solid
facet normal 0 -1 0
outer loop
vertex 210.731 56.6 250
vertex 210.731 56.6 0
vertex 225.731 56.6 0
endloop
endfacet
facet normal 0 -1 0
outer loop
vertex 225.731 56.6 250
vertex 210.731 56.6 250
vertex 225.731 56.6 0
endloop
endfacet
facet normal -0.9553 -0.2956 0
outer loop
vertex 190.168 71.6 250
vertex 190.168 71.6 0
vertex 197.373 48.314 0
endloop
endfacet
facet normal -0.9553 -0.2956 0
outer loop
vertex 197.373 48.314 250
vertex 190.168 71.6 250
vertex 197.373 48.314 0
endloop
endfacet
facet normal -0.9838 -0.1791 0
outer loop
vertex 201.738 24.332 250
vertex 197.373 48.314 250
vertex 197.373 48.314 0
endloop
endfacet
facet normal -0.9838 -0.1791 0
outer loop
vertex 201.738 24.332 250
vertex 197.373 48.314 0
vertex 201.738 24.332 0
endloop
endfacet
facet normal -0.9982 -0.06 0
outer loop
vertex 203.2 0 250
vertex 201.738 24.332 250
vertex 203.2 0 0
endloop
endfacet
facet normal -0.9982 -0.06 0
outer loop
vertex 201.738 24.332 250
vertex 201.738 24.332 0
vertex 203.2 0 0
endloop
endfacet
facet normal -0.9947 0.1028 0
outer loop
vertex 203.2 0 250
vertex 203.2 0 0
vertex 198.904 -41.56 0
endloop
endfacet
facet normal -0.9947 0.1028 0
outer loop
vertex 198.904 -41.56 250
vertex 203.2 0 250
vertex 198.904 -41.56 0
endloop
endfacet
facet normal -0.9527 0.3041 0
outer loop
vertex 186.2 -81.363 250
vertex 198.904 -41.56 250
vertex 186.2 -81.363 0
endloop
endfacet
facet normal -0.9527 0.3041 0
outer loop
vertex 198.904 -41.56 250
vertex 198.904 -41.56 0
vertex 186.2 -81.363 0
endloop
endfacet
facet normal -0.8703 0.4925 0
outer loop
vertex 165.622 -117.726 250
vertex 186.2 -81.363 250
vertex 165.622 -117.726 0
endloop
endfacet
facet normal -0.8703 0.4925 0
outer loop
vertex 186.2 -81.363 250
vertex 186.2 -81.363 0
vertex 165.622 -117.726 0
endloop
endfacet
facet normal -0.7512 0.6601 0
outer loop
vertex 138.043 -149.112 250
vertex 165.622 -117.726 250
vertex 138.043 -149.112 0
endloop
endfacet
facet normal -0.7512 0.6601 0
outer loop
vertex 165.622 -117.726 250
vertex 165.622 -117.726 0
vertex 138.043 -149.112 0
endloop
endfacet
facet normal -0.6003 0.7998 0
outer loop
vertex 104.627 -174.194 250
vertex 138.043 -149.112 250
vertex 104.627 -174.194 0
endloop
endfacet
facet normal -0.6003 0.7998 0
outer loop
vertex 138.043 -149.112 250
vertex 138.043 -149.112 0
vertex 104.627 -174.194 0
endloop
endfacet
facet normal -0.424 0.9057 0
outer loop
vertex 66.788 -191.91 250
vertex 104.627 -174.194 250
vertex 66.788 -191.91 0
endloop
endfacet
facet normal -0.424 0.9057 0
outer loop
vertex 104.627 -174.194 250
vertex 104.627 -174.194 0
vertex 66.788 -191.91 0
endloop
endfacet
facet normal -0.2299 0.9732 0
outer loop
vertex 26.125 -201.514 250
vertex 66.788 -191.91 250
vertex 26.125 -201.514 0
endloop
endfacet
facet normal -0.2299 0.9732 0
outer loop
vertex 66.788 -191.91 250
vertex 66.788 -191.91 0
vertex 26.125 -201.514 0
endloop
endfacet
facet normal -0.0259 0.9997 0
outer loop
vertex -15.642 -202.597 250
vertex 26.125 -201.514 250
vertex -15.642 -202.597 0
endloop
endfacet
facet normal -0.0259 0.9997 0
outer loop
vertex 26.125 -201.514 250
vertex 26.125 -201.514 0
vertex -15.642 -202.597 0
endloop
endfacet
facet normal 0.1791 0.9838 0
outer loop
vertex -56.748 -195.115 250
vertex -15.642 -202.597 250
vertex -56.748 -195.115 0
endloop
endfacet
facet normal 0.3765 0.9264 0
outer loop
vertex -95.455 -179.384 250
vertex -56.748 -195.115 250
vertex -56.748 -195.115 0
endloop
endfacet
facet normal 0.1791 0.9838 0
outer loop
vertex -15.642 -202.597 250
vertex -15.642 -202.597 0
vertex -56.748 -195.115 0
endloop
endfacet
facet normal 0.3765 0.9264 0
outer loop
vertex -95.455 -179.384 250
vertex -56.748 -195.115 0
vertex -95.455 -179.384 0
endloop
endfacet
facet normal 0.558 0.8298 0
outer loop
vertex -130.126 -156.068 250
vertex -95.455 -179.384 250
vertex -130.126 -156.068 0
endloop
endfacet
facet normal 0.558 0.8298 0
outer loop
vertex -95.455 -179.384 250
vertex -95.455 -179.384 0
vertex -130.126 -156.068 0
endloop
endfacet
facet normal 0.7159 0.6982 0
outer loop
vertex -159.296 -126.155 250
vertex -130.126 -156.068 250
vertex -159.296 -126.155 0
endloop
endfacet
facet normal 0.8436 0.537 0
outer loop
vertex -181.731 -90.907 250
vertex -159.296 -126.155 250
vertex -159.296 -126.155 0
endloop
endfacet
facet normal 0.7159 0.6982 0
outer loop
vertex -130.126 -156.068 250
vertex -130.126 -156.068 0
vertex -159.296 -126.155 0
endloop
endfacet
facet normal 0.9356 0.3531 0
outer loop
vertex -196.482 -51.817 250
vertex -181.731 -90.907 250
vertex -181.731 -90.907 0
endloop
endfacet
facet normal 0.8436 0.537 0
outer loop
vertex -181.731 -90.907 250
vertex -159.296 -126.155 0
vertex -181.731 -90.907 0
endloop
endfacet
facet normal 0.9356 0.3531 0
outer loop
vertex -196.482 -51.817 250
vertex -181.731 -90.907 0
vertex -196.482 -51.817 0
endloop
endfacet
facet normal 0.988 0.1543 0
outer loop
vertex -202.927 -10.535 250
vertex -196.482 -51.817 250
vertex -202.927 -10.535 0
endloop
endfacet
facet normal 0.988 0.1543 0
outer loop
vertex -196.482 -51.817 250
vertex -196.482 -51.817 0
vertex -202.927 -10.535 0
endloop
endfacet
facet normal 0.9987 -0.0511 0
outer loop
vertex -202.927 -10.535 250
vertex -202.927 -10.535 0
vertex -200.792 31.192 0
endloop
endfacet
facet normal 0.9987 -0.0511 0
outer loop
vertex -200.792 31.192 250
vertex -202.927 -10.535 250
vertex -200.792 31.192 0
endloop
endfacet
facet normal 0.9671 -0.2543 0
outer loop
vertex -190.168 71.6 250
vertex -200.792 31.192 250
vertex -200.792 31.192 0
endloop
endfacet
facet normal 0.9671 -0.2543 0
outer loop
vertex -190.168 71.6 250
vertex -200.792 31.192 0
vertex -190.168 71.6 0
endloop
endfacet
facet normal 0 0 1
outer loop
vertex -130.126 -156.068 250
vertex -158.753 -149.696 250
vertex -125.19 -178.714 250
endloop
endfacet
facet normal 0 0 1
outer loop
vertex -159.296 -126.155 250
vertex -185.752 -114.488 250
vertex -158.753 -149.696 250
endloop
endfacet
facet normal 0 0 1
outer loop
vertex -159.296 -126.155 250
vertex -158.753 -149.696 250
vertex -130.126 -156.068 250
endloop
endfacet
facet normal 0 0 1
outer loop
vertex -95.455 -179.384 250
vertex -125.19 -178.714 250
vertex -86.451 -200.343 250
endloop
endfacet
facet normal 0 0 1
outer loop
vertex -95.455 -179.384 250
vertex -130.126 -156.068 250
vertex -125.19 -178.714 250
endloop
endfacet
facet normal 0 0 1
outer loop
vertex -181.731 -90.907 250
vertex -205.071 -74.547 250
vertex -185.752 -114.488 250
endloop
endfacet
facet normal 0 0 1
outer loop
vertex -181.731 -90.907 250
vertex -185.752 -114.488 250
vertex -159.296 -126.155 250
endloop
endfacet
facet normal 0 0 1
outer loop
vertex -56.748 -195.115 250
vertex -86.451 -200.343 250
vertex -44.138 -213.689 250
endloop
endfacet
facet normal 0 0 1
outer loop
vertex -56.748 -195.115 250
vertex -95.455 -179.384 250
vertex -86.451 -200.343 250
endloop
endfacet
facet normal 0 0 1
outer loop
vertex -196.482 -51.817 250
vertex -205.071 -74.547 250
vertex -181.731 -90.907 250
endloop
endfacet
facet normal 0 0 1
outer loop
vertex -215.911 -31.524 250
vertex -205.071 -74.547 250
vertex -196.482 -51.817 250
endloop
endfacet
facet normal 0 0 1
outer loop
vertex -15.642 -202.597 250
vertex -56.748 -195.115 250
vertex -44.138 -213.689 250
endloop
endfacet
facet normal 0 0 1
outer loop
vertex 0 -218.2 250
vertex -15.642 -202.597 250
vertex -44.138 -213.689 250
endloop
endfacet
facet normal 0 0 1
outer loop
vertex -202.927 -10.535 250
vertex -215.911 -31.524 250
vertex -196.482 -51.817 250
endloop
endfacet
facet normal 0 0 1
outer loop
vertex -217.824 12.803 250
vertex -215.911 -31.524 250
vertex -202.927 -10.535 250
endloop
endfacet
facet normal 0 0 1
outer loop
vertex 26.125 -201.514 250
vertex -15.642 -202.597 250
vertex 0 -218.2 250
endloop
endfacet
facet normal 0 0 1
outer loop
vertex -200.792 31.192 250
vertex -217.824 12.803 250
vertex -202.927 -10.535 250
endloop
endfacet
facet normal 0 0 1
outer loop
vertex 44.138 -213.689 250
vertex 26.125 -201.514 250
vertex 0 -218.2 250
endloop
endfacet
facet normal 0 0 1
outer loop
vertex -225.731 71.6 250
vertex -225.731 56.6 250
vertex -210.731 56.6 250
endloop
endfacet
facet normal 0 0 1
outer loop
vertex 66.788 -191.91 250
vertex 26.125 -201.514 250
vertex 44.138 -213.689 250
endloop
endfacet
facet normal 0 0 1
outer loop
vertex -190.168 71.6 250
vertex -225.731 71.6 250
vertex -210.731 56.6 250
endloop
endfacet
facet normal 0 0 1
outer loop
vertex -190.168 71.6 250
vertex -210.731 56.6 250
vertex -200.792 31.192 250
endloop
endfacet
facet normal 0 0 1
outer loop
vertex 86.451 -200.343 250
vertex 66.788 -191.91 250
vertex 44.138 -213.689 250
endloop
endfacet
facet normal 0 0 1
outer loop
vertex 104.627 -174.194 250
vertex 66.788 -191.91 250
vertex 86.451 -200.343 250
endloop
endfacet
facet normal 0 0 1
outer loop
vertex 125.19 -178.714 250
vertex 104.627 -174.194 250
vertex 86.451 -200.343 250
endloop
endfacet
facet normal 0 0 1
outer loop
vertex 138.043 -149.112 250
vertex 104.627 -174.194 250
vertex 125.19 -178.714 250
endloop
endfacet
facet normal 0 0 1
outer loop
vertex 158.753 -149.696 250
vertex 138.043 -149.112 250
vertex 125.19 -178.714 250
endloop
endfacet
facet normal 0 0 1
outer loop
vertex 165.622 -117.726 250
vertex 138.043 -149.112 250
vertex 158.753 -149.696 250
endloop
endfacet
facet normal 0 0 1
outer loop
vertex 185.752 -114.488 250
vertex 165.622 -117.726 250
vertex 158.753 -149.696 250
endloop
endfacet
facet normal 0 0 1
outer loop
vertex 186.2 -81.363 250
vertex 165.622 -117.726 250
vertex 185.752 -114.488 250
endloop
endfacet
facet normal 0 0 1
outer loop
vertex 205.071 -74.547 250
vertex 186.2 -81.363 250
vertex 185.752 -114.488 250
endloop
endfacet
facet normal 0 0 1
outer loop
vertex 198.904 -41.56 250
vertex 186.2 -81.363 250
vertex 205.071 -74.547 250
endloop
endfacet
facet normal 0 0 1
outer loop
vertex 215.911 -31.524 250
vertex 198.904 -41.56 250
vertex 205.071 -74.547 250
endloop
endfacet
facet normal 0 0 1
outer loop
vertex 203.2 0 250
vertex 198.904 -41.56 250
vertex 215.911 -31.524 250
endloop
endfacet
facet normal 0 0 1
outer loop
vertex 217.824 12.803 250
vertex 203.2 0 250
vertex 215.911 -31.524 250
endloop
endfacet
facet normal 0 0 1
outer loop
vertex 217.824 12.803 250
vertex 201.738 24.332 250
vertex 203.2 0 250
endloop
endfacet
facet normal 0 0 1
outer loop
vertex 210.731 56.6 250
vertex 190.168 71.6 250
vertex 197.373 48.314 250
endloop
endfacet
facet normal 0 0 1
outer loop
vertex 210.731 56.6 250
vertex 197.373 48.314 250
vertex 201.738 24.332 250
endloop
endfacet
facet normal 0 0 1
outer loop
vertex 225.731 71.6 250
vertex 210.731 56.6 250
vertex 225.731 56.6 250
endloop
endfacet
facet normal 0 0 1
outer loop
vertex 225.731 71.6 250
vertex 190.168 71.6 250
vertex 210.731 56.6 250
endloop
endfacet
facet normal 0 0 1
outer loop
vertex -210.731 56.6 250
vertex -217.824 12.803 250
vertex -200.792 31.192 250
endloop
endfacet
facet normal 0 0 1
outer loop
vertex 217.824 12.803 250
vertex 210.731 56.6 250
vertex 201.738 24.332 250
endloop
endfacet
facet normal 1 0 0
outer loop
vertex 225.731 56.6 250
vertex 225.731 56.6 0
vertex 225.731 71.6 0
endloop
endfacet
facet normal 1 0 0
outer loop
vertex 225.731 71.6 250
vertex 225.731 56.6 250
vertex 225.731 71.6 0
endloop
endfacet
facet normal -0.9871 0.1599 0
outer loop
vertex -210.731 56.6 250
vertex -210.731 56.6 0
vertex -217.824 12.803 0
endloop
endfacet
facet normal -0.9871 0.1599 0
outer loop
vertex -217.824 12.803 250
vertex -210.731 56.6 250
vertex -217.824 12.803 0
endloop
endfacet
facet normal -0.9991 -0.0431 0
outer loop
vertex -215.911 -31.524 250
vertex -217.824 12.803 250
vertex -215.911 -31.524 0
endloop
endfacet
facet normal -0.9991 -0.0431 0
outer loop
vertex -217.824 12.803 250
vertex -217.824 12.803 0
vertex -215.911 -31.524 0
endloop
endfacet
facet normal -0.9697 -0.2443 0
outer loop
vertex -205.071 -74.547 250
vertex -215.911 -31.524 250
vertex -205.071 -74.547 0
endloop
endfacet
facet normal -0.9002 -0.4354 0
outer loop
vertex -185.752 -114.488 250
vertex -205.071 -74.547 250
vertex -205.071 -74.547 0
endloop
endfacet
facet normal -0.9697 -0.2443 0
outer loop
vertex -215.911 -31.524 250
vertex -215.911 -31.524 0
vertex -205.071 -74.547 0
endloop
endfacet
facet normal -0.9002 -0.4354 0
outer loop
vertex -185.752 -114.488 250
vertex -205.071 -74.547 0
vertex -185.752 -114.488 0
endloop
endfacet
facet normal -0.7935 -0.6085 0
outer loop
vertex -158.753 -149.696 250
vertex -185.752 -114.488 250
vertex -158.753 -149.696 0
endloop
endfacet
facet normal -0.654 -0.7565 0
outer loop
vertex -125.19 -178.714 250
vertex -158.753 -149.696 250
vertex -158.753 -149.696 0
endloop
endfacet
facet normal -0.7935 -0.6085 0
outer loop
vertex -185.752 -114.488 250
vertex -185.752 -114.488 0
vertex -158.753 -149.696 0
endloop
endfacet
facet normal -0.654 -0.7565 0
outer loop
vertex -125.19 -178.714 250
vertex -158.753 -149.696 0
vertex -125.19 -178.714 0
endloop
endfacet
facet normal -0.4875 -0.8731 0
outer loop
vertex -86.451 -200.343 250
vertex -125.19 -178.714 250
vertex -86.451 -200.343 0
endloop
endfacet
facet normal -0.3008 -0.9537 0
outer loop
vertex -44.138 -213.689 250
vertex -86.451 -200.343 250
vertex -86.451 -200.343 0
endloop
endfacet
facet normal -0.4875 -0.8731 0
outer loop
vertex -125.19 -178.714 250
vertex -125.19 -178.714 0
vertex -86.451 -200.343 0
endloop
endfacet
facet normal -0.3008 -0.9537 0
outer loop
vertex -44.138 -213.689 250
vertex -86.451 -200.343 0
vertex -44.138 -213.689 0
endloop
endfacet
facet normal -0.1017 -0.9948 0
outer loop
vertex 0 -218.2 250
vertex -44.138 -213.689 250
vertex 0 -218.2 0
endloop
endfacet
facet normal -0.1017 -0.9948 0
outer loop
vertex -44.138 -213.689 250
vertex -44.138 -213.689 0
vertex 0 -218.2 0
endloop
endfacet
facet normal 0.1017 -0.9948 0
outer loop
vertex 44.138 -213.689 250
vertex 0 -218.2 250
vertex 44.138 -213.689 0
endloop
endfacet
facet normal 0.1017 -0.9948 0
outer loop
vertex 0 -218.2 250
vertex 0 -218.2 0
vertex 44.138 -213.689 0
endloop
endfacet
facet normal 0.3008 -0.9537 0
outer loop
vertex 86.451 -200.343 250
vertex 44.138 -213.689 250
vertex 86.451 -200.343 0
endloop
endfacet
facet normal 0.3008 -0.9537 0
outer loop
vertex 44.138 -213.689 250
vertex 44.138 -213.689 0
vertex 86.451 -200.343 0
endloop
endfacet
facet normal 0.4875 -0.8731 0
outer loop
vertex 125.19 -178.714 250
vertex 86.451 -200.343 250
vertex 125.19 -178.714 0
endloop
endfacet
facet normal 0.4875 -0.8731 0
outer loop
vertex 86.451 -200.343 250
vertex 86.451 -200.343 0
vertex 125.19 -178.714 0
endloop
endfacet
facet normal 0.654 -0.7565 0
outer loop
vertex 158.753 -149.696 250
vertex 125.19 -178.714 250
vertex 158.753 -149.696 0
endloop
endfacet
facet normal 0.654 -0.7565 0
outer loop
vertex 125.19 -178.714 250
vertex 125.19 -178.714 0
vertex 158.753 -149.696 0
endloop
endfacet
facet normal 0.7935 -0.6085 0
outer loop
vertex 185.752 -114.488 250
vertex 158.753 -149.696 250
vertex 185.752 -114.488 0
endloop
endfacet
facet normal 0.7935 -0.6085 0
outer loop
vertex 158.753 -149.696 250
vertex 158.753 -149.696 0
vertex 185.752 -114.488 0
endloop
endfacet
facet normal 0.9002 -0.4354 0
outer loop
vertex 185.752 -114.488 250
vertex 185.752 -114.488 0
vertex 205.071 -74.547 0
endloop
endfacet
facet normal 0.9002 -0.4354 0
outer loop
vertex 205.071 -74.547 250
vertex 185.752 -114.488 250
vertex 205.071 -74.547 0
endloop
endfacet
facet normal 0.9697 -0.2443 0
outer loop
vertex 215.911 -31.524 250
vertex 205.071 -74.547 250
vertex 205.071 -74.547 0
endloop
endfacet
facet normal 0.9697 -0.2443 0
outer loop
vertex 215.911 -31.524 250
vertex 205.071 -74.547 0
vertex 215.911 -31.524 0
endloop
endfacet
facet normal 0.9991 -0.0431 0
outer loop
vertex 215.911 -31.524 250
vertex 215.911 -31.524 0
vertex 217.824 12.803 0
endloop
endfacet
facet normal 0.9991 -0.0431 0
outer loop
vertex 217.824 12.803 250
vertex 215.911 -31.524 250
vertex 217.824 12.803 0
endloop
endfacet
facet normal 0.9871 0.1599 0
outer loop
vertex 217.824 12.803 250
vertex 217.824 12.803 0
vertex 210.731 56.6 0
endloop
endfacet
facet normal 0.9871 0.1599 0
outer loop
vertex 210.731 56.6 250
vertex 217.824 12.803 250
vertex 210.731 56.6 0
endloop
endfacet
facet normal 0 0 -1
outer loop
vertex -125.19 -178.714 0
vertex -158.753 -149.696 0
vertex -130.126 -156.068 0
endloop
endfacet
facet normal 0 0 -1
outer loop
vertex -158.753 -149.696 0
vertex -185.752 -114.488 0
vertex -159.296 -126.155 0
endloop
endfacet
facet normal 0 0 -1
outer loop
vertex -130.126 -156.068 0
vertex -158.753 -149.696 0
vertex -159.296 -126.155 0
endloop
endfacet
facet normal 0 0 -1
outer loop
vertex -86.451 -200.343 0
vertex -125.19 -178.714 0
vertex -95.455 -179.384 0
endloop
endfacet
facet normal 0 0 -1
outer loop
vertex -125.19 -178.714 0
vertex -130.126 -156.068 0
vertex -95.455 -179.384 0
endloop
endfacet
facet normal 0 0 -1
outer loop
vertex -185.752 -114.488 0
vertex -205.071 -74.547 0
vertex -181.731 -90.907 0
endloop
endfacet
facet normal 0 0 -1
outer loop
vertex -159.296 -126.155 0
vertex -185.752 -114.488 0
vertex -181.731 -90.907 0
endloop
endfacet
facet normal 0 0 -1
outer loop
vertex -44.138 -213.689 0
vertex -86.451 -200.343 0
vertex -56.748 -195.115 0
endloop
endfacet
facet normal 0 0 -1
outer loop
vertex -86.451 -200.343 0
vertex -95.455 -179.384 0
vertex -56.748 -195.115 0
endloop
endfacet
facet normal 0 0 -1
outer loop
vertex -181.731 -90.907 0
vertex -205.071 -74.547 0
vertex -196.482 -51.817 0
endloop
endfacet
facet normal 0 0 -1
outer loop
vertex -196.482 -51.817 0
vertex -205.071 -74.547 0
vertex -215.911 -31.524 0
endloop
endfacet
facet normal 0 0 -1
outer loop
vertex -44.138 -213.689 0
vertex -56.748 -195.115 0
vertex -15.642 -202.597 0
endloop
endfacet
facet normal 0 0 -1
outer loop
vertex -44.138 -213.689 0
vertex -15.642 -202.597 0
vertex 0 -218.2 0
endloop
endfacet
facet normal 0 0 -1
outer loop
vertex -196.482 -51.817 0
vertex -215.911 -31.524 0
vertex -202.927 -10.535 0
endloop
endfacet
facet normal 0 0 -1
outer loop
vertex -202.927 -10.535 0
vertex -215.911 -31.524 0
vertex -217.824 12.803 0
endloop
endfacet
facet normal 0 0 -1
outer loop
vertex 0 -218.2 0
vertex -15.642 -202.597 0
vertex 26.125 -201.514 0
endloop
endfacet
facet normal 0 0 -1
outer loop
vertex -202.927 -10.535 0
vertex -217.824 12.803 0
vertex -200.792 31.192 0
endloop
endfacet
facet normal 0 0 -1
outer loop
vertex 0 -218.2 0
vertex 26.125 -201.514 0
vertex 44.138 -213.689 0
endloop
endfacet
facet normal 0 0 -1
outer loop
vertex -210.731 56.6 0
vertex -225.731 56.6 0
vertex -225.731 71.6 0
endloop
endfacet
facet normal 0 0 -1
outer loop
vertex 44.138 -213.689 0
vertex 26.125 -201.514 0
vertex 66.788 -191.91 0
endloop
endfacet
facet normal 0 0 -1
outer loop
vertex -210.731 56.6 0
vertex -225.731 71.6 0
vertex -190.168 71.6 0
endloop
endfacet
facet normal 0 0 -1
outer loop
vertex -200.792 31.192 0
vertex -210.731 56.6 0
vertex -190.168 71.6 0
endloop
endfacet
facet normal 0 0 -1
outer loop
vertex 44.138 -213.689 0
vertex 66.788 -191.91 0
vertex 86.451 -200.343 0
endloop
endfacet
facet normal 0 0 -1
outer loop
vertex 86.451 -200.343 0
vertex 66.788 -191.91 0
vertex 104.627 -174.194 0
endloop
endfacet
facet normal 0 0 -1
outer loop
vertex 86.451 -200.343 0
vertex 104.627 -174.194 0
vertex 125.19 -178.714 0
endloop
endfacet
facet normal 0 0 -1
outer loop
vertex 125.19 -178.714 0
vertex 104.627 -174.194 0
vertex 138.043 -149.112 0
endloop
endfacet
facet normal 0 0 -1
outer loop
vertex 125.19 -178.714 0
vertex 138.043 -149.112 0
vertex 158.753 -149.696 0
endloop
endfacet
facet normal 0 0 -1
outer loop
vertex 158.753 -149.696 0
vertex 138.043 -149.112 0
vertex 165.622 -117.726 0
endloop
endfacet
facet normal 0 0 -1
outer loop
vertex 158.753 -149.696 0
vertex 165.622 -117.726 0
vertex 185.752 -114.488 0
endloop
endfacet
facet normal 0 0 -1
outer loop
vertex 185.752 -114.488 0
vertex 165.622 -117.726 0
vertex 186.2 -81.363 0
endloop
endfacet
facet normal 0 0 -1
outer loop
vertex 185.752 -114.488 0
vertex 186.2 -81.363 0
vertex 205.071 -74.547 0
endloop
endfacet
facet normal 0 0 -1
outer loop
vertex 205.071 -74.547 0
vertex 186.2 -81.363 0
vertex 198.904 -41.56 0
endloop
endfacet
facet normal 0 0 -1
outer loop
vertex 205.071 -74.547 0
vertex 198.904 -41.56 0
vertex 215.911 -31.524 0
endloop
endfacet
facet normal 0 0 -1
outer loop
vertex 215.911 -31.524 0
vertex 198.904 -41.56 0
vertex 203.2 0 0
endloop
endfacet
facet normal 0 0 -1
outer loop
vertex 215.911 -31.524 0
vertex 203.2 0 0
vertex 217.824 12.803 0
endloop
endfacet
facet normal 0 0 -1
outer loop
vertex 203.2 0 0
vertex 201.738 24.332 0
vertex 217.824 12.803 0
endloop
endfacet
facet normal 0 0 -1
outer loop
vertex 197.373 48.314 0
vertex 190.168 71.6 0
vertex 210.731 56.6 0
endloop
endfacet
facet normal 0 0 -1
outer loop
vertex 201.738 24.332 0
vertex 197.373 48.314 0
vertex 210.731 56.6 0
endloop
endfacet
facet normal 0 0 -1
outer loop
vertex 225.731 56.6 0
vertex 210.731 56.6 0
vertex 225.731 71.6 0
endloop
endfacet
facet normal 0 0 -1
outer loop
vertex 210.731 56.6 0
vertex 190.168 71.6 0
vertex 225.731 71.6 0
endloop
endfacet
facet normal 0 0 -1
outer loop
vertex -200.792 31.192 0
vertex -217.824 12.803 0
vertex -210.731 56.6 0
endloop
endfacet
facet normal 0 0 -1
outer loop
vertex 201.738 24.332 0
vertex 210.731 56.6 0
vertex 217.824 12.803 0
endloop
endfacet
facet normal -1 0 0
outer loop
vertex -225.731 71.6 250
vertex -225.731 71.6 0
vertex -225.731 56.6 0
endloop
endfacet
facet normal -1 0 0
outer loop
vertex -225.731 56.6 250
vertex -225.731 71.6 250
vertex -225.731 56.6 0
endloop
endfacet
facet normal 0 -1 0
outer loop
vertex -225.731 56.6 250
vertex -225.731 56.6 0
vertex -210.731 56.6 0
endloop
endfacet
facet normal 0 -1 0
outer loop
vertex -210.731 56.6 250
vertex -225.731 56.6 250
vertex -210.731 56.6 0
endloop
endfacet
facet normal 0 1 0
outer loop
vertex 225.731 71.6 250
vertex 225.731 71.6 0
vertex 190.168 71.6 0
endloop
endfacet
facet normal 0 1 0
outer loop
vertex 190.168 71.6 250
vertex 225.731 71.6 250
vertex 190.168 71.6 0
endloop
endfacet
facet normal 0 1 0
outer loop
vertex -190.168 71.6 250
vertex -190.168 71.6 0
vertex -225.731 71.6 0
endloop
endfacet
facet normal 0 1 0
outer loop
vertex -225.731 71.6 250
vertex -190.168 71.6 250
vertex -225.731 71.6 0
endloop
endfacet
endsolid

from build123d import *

# Parameters (mm, degrees)
F1_DEPTH = 250


# Not quite as in the source:
# - a feature names something its author has since deleted; it is built from what else it names


with BuildPart() as f1:
    # F0 (on Top) → F1 (new body)
    with BuildSketch(Plane.XY):
        with BuildLine():
            Line((-225.7312981026, 56.6), (-210.7312981026, 56.6))
            ThreePointArc((-210.7312981026, 56.6), (-208.5596069481, 64.1414869616), (-206.1181214741, 71.6))
            Line((-206.1181214741, 71.6), (-225.7312981026, 71.6))
            Line((-225.7312981026, 71.6), (-225.7312981026, 56.6))
        make_face()
        with BuildLine():
            ThreePointArc((206.1181214741, 71.6), (208.5596069481, 64.1414869616), (210.7312981026, 56.6))
            Line((210.7312981026, 56.6), (225.7312981026, 56.6))
            Line((225.7312981026, 56.6), (225.7312981026, 71.6))
            Line((225.7312981026, 71.6), (206.1181214741, 71.6))
        make_face()
        with BuildLine():
            ThreePointArc((-210.7312981026, 56.6), (-28.5453214557, -216.3247665502), (218.2, 0))
            ThreePointArc((218.2, 0), (216.3247665502, 28.5453214557), (210.7312981026, 56.6))
            ThreePointArc((210.7312981026, 56.6), (208.5596069481, 64.1414869616), (206.1181214741, 71.6))
            Line((206.1181214741, 71.6), (190.1675051106, 71.6))
            ThreePointArc((190.1675051106, 71.6), (199.9153283749, 36.3882052424), (203.2, 0))
            ThreePointArc((203.2, 0), (-36.3882052424, -199.9153283749), (-190.1675051106, 71.6))
            Line((-190.1675051106, 71.6), (-206.1181214741, 71.6))
            ThreePointArc((-206.1181214741, 71.6), (-208.5596069481, 64.1414869616), (-210.7312981026, 56.6))
        make_face()
    extrude(amount=F1_DEPTH)


solid = f1.part
